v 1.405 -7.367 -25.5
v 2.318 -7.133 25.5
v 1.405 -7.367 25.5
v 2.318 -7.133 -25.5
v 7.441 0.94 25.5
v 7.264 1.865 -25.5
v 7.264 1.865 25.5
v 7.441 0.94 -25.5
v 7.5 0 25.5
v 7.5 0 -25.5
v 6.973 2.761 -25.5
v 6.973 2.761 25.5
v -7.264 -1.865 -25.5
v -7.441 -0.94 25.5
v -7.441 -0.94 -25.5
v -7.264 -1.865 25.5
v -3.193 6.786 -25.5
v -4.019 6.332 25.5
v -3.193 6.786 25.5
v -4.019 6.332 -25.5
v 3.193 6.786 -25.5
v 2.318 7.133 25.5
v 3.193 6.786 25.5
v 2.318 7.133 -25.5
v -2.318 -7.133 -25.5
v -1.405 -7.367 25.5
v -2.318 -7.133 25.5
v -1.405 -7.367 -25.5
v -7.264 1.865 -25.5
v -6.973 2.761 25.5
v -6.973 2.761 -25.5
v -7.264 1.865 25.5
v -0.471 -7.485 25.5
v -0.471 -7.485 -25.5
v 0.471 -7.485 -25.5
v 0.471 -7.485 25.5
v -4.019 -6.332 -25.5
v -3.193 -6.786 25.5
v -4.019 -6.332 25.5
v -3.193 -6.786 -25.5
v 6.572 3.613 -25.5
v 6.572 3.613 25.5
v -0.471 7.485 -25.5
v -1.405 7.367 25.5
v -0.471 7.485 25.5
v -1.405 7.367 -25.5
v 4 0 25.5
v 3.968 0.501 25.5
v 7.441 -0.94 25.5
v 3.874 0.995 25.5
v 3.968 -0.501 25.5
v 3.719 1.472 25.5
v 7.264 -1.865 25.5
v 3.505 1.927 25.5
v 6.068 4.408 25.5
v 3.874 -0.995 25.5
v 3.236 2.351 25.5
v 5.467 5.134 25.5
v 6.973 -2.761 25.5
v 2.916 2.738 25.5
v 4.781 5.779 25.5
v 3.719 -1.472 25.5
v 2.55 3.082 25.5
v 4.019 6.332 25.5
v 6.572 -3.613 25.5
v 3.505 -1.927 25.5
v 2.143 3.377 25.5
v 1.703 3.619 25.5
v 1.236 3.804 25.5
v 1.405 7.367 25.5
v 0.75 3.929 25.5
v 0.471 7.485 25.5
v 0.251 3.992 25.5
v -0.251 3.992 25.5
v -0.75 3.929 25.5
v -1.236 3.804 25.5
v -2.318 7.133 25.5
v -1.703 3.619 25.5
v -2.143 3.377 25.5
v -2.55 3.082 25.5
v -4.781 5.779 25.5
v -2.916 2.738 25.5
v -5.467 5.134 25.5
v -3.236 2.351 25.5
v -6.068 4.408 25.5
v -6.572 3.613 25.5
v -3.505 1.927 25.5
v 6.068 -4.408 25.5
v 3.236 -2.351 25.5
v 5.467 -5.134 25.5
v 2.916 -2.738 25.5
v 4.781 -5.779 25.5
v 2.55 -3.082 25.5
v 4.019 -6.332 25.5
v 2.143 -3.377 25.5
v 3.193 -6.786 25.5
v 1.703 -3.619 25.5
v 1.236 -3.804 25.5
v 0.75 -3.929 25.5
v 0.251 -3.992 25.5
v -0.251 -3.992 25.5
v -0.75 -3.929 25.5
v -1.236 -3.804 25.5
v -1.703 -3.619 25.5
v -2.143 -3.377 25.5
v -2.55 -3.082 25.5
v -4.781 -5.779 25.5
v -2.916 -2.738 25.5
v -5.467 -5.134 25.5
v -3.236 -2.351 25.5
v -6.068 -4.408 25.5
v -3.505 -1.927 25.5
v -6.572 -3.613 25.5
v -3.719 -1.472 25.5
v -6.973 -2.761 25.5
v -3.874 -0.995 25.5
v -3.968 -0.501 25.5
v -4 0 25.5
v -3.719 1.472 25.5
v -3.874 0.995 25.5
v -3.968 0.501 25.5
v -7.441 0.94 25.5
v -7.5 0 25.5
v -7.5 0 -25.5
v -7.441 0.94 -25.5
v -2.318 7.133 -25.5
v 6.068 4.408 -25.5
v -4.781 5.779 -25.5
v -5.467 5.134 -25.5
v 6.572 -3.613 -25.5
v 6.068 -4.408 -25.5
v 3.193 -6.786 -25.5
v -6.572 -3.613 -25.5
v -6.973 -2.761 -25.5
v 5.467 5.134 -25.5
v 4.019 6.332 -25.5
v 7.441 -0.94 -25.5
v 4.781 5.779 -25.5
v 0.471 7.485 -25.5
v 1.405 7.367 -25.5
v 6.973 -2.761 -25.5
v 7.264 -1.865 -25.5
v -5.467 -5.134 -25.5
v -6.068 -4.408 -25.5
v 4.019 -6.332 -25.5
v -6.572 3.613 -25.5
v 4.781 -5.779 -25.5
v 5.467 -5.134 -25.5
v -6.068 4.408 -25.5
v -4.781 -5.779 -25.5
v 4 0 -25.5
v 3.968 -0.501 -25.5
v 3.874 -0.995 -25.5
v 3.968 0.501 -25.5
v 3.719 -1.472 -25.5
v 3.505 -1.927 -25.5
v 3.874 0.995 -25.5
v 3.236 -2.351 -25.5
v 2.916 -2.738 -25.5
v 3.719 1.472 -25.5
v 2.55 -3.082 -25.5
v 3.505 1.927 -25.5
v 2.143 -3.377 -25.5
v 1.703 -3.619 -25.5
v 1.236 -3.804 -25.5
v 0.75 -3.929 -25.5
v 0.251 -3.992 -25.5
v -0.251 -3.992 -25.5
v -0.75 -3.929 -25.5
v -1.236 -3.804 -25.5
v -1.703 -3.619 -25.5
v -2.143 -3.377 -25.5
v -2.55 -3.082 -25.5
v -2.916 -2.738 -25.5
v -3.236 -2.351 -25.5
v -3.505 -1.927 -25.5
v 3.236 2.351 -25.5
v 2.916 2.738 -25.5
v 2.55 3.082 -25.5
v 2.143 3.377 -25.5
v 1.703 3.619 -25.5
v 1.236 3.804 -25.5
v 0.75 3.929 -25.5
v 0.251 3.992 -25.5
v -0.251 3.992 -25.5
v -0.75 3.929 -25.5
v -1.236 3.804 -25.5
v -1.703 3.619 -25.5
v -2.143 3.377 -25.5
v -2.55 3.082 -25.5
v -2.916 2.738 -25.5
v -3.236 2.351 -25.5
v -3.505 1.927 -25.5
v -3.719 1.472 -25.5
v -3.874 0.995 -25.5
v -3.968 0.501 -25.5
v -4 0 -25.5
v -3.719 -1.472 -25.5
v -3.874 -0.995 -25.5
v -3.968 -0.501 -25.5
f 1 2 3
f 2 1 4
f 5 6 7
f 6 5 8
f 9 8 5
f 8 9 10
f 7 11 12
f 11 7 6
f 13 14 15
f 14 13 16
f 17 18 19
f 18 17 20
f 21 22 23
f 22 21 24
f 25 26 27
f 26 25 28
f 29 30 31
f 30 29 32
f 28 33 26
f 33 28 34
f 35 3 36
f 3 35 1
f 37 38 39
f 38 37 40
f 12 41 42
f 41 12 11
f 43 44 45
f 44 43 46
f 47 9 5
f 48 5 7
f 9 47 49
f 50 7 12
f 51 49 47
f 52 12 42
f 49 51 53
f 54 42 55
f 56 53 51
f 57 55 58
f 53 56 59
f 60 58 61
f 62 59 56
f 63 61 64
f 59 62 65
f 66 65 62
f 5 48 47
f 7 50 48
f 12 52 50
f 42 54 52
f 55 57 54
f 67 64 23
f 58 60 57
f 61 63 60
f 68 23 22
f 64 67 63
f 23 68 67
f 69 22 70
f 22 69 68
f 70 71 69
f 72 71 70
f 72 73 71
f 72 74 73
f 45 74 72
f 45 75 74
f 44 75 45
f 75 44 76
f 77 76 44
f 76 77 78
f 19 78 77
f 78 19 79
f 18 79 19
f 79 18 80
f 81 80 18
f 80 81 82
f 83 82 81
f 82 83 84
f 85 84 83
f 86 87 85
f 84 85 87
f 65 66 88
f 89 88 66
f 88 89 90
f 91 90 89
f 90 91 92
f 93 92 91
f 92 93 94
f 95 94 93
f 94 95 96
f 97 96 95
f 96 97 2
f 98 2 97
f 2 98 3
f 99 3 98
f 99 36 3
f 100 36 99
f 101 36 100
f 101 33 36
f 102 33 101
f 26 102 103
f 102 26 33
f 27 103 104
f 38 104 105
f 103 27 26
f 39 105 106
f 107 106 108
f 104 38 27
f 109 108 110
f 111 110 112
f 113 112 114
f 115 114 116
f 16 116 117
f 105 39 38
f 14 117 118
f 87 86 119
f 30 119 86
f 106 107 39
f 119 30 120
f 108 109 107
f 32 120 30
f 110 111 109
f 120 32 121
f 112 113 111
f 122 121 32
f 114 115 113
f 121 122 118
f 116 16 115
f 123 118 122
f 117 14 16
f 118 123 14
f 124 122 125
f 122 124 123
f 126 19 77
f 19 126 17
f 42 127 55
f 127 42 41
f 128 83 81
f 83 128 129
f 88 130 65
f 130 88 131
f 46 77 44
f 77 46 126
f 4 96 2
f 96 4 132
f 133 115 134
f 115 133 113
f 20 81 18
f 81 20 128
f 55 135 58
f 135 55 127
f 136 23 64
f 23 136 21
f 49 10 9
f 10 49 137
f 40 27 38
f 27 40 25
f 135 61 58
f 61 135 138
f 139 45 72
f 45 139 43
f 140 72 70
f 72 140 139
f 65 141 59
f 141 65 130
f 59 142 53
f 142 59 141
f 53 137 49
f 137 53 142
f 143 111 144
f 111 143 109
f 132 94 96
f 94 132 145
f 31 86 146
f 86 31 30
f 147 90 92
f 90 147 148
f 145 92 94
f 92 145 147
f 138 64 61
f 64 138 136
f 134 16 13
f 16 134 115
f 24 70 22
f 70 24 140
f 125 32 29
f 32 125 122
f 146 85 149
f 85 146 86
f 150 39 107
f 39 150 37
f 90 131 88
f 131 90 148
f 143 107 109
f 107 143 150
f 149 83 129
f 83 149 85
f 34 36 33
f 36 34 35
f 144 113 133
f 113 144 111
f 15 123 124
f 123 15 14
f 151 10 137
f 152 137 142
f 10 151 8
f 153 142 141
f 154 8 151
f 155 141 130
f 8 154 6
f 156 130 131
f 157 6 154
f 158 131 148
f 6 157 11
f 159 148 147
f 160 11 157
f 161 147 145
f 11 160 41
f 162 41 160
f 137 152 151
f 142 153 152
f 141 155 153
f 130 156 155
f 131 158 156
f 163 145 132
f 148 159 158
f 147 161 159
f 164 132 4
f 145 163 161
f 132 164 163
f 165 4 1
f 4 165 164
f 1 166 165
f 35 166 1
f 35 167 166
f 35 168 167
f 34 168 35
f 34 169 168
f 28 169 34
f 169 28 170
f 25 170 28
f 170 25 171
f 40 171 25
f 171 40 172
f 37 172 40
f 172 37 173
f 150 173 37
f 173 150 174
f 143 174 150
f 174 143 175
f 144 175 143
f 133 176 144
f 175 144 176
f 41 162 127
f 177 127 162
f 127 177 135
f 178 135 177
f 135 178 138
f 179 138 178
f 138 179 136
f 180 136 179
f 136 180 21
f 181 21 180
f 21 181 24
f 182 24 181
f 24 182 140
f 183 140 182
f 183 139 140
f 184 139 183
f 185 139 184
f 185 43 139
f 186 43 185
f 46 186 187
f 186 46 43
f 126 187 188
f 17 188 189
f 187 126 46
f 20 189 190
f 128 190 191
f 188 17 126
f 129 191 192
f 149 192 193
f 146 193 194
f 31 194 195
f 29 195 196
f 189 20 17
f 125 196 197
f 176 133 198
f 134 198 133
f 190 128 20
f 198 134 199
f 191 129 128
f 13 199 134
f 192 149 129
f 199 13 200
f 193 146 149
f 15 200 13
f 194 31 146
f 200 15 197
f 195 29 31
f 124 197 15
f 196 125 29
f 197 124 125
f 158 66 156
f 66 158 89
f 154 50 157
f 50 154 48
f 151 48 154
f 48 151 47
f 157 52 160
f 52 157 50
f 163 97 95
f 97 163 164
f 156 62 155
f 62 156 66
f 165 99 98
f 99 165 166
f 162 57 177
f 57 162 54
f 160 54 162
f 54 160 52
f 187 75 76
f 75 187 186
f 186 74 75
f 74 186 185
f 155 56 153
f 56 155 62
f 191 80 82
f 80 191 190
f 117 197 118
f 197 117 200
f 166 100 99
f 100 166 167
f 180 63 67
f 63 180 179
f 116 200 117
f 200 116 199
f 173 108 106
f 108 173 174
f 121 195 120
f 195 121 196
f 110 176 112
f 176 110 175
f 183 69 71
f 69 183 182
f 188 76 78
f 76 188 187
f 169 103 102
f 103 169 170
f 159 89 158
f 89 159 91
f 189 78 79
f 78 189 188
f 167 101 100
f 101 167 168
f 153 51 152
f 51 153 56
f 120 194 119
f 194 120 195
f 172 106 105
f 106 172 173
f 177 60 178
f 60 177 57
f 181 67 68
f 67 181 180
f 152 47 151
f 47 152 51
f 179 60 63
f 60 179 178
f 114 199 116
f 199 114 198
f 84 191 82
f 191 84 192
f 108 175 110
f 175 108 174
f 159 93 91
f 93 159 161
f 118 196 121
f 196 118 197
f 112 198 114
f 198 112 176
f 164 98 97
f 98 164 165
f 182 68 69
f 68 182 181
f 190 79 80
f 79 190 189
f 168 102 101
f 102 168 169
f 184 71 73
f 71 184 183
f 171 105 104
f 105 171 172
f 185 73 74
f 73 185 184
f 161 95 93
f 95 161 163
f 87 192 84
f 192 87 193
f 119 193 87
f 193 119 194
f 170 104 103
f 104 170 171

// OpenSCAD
$fn = 50;


difference() {
	union() {
		translate(v = [0, 0, -25.5000000000]) {
			cylinder(h = 51, r = 7.5000000000);
		}
	}
	union() {
		translate(v = [0, 0, -100.0000000000]) {
			cylinder(h = 200, r = 4.0000000000);
		}
	}
}
